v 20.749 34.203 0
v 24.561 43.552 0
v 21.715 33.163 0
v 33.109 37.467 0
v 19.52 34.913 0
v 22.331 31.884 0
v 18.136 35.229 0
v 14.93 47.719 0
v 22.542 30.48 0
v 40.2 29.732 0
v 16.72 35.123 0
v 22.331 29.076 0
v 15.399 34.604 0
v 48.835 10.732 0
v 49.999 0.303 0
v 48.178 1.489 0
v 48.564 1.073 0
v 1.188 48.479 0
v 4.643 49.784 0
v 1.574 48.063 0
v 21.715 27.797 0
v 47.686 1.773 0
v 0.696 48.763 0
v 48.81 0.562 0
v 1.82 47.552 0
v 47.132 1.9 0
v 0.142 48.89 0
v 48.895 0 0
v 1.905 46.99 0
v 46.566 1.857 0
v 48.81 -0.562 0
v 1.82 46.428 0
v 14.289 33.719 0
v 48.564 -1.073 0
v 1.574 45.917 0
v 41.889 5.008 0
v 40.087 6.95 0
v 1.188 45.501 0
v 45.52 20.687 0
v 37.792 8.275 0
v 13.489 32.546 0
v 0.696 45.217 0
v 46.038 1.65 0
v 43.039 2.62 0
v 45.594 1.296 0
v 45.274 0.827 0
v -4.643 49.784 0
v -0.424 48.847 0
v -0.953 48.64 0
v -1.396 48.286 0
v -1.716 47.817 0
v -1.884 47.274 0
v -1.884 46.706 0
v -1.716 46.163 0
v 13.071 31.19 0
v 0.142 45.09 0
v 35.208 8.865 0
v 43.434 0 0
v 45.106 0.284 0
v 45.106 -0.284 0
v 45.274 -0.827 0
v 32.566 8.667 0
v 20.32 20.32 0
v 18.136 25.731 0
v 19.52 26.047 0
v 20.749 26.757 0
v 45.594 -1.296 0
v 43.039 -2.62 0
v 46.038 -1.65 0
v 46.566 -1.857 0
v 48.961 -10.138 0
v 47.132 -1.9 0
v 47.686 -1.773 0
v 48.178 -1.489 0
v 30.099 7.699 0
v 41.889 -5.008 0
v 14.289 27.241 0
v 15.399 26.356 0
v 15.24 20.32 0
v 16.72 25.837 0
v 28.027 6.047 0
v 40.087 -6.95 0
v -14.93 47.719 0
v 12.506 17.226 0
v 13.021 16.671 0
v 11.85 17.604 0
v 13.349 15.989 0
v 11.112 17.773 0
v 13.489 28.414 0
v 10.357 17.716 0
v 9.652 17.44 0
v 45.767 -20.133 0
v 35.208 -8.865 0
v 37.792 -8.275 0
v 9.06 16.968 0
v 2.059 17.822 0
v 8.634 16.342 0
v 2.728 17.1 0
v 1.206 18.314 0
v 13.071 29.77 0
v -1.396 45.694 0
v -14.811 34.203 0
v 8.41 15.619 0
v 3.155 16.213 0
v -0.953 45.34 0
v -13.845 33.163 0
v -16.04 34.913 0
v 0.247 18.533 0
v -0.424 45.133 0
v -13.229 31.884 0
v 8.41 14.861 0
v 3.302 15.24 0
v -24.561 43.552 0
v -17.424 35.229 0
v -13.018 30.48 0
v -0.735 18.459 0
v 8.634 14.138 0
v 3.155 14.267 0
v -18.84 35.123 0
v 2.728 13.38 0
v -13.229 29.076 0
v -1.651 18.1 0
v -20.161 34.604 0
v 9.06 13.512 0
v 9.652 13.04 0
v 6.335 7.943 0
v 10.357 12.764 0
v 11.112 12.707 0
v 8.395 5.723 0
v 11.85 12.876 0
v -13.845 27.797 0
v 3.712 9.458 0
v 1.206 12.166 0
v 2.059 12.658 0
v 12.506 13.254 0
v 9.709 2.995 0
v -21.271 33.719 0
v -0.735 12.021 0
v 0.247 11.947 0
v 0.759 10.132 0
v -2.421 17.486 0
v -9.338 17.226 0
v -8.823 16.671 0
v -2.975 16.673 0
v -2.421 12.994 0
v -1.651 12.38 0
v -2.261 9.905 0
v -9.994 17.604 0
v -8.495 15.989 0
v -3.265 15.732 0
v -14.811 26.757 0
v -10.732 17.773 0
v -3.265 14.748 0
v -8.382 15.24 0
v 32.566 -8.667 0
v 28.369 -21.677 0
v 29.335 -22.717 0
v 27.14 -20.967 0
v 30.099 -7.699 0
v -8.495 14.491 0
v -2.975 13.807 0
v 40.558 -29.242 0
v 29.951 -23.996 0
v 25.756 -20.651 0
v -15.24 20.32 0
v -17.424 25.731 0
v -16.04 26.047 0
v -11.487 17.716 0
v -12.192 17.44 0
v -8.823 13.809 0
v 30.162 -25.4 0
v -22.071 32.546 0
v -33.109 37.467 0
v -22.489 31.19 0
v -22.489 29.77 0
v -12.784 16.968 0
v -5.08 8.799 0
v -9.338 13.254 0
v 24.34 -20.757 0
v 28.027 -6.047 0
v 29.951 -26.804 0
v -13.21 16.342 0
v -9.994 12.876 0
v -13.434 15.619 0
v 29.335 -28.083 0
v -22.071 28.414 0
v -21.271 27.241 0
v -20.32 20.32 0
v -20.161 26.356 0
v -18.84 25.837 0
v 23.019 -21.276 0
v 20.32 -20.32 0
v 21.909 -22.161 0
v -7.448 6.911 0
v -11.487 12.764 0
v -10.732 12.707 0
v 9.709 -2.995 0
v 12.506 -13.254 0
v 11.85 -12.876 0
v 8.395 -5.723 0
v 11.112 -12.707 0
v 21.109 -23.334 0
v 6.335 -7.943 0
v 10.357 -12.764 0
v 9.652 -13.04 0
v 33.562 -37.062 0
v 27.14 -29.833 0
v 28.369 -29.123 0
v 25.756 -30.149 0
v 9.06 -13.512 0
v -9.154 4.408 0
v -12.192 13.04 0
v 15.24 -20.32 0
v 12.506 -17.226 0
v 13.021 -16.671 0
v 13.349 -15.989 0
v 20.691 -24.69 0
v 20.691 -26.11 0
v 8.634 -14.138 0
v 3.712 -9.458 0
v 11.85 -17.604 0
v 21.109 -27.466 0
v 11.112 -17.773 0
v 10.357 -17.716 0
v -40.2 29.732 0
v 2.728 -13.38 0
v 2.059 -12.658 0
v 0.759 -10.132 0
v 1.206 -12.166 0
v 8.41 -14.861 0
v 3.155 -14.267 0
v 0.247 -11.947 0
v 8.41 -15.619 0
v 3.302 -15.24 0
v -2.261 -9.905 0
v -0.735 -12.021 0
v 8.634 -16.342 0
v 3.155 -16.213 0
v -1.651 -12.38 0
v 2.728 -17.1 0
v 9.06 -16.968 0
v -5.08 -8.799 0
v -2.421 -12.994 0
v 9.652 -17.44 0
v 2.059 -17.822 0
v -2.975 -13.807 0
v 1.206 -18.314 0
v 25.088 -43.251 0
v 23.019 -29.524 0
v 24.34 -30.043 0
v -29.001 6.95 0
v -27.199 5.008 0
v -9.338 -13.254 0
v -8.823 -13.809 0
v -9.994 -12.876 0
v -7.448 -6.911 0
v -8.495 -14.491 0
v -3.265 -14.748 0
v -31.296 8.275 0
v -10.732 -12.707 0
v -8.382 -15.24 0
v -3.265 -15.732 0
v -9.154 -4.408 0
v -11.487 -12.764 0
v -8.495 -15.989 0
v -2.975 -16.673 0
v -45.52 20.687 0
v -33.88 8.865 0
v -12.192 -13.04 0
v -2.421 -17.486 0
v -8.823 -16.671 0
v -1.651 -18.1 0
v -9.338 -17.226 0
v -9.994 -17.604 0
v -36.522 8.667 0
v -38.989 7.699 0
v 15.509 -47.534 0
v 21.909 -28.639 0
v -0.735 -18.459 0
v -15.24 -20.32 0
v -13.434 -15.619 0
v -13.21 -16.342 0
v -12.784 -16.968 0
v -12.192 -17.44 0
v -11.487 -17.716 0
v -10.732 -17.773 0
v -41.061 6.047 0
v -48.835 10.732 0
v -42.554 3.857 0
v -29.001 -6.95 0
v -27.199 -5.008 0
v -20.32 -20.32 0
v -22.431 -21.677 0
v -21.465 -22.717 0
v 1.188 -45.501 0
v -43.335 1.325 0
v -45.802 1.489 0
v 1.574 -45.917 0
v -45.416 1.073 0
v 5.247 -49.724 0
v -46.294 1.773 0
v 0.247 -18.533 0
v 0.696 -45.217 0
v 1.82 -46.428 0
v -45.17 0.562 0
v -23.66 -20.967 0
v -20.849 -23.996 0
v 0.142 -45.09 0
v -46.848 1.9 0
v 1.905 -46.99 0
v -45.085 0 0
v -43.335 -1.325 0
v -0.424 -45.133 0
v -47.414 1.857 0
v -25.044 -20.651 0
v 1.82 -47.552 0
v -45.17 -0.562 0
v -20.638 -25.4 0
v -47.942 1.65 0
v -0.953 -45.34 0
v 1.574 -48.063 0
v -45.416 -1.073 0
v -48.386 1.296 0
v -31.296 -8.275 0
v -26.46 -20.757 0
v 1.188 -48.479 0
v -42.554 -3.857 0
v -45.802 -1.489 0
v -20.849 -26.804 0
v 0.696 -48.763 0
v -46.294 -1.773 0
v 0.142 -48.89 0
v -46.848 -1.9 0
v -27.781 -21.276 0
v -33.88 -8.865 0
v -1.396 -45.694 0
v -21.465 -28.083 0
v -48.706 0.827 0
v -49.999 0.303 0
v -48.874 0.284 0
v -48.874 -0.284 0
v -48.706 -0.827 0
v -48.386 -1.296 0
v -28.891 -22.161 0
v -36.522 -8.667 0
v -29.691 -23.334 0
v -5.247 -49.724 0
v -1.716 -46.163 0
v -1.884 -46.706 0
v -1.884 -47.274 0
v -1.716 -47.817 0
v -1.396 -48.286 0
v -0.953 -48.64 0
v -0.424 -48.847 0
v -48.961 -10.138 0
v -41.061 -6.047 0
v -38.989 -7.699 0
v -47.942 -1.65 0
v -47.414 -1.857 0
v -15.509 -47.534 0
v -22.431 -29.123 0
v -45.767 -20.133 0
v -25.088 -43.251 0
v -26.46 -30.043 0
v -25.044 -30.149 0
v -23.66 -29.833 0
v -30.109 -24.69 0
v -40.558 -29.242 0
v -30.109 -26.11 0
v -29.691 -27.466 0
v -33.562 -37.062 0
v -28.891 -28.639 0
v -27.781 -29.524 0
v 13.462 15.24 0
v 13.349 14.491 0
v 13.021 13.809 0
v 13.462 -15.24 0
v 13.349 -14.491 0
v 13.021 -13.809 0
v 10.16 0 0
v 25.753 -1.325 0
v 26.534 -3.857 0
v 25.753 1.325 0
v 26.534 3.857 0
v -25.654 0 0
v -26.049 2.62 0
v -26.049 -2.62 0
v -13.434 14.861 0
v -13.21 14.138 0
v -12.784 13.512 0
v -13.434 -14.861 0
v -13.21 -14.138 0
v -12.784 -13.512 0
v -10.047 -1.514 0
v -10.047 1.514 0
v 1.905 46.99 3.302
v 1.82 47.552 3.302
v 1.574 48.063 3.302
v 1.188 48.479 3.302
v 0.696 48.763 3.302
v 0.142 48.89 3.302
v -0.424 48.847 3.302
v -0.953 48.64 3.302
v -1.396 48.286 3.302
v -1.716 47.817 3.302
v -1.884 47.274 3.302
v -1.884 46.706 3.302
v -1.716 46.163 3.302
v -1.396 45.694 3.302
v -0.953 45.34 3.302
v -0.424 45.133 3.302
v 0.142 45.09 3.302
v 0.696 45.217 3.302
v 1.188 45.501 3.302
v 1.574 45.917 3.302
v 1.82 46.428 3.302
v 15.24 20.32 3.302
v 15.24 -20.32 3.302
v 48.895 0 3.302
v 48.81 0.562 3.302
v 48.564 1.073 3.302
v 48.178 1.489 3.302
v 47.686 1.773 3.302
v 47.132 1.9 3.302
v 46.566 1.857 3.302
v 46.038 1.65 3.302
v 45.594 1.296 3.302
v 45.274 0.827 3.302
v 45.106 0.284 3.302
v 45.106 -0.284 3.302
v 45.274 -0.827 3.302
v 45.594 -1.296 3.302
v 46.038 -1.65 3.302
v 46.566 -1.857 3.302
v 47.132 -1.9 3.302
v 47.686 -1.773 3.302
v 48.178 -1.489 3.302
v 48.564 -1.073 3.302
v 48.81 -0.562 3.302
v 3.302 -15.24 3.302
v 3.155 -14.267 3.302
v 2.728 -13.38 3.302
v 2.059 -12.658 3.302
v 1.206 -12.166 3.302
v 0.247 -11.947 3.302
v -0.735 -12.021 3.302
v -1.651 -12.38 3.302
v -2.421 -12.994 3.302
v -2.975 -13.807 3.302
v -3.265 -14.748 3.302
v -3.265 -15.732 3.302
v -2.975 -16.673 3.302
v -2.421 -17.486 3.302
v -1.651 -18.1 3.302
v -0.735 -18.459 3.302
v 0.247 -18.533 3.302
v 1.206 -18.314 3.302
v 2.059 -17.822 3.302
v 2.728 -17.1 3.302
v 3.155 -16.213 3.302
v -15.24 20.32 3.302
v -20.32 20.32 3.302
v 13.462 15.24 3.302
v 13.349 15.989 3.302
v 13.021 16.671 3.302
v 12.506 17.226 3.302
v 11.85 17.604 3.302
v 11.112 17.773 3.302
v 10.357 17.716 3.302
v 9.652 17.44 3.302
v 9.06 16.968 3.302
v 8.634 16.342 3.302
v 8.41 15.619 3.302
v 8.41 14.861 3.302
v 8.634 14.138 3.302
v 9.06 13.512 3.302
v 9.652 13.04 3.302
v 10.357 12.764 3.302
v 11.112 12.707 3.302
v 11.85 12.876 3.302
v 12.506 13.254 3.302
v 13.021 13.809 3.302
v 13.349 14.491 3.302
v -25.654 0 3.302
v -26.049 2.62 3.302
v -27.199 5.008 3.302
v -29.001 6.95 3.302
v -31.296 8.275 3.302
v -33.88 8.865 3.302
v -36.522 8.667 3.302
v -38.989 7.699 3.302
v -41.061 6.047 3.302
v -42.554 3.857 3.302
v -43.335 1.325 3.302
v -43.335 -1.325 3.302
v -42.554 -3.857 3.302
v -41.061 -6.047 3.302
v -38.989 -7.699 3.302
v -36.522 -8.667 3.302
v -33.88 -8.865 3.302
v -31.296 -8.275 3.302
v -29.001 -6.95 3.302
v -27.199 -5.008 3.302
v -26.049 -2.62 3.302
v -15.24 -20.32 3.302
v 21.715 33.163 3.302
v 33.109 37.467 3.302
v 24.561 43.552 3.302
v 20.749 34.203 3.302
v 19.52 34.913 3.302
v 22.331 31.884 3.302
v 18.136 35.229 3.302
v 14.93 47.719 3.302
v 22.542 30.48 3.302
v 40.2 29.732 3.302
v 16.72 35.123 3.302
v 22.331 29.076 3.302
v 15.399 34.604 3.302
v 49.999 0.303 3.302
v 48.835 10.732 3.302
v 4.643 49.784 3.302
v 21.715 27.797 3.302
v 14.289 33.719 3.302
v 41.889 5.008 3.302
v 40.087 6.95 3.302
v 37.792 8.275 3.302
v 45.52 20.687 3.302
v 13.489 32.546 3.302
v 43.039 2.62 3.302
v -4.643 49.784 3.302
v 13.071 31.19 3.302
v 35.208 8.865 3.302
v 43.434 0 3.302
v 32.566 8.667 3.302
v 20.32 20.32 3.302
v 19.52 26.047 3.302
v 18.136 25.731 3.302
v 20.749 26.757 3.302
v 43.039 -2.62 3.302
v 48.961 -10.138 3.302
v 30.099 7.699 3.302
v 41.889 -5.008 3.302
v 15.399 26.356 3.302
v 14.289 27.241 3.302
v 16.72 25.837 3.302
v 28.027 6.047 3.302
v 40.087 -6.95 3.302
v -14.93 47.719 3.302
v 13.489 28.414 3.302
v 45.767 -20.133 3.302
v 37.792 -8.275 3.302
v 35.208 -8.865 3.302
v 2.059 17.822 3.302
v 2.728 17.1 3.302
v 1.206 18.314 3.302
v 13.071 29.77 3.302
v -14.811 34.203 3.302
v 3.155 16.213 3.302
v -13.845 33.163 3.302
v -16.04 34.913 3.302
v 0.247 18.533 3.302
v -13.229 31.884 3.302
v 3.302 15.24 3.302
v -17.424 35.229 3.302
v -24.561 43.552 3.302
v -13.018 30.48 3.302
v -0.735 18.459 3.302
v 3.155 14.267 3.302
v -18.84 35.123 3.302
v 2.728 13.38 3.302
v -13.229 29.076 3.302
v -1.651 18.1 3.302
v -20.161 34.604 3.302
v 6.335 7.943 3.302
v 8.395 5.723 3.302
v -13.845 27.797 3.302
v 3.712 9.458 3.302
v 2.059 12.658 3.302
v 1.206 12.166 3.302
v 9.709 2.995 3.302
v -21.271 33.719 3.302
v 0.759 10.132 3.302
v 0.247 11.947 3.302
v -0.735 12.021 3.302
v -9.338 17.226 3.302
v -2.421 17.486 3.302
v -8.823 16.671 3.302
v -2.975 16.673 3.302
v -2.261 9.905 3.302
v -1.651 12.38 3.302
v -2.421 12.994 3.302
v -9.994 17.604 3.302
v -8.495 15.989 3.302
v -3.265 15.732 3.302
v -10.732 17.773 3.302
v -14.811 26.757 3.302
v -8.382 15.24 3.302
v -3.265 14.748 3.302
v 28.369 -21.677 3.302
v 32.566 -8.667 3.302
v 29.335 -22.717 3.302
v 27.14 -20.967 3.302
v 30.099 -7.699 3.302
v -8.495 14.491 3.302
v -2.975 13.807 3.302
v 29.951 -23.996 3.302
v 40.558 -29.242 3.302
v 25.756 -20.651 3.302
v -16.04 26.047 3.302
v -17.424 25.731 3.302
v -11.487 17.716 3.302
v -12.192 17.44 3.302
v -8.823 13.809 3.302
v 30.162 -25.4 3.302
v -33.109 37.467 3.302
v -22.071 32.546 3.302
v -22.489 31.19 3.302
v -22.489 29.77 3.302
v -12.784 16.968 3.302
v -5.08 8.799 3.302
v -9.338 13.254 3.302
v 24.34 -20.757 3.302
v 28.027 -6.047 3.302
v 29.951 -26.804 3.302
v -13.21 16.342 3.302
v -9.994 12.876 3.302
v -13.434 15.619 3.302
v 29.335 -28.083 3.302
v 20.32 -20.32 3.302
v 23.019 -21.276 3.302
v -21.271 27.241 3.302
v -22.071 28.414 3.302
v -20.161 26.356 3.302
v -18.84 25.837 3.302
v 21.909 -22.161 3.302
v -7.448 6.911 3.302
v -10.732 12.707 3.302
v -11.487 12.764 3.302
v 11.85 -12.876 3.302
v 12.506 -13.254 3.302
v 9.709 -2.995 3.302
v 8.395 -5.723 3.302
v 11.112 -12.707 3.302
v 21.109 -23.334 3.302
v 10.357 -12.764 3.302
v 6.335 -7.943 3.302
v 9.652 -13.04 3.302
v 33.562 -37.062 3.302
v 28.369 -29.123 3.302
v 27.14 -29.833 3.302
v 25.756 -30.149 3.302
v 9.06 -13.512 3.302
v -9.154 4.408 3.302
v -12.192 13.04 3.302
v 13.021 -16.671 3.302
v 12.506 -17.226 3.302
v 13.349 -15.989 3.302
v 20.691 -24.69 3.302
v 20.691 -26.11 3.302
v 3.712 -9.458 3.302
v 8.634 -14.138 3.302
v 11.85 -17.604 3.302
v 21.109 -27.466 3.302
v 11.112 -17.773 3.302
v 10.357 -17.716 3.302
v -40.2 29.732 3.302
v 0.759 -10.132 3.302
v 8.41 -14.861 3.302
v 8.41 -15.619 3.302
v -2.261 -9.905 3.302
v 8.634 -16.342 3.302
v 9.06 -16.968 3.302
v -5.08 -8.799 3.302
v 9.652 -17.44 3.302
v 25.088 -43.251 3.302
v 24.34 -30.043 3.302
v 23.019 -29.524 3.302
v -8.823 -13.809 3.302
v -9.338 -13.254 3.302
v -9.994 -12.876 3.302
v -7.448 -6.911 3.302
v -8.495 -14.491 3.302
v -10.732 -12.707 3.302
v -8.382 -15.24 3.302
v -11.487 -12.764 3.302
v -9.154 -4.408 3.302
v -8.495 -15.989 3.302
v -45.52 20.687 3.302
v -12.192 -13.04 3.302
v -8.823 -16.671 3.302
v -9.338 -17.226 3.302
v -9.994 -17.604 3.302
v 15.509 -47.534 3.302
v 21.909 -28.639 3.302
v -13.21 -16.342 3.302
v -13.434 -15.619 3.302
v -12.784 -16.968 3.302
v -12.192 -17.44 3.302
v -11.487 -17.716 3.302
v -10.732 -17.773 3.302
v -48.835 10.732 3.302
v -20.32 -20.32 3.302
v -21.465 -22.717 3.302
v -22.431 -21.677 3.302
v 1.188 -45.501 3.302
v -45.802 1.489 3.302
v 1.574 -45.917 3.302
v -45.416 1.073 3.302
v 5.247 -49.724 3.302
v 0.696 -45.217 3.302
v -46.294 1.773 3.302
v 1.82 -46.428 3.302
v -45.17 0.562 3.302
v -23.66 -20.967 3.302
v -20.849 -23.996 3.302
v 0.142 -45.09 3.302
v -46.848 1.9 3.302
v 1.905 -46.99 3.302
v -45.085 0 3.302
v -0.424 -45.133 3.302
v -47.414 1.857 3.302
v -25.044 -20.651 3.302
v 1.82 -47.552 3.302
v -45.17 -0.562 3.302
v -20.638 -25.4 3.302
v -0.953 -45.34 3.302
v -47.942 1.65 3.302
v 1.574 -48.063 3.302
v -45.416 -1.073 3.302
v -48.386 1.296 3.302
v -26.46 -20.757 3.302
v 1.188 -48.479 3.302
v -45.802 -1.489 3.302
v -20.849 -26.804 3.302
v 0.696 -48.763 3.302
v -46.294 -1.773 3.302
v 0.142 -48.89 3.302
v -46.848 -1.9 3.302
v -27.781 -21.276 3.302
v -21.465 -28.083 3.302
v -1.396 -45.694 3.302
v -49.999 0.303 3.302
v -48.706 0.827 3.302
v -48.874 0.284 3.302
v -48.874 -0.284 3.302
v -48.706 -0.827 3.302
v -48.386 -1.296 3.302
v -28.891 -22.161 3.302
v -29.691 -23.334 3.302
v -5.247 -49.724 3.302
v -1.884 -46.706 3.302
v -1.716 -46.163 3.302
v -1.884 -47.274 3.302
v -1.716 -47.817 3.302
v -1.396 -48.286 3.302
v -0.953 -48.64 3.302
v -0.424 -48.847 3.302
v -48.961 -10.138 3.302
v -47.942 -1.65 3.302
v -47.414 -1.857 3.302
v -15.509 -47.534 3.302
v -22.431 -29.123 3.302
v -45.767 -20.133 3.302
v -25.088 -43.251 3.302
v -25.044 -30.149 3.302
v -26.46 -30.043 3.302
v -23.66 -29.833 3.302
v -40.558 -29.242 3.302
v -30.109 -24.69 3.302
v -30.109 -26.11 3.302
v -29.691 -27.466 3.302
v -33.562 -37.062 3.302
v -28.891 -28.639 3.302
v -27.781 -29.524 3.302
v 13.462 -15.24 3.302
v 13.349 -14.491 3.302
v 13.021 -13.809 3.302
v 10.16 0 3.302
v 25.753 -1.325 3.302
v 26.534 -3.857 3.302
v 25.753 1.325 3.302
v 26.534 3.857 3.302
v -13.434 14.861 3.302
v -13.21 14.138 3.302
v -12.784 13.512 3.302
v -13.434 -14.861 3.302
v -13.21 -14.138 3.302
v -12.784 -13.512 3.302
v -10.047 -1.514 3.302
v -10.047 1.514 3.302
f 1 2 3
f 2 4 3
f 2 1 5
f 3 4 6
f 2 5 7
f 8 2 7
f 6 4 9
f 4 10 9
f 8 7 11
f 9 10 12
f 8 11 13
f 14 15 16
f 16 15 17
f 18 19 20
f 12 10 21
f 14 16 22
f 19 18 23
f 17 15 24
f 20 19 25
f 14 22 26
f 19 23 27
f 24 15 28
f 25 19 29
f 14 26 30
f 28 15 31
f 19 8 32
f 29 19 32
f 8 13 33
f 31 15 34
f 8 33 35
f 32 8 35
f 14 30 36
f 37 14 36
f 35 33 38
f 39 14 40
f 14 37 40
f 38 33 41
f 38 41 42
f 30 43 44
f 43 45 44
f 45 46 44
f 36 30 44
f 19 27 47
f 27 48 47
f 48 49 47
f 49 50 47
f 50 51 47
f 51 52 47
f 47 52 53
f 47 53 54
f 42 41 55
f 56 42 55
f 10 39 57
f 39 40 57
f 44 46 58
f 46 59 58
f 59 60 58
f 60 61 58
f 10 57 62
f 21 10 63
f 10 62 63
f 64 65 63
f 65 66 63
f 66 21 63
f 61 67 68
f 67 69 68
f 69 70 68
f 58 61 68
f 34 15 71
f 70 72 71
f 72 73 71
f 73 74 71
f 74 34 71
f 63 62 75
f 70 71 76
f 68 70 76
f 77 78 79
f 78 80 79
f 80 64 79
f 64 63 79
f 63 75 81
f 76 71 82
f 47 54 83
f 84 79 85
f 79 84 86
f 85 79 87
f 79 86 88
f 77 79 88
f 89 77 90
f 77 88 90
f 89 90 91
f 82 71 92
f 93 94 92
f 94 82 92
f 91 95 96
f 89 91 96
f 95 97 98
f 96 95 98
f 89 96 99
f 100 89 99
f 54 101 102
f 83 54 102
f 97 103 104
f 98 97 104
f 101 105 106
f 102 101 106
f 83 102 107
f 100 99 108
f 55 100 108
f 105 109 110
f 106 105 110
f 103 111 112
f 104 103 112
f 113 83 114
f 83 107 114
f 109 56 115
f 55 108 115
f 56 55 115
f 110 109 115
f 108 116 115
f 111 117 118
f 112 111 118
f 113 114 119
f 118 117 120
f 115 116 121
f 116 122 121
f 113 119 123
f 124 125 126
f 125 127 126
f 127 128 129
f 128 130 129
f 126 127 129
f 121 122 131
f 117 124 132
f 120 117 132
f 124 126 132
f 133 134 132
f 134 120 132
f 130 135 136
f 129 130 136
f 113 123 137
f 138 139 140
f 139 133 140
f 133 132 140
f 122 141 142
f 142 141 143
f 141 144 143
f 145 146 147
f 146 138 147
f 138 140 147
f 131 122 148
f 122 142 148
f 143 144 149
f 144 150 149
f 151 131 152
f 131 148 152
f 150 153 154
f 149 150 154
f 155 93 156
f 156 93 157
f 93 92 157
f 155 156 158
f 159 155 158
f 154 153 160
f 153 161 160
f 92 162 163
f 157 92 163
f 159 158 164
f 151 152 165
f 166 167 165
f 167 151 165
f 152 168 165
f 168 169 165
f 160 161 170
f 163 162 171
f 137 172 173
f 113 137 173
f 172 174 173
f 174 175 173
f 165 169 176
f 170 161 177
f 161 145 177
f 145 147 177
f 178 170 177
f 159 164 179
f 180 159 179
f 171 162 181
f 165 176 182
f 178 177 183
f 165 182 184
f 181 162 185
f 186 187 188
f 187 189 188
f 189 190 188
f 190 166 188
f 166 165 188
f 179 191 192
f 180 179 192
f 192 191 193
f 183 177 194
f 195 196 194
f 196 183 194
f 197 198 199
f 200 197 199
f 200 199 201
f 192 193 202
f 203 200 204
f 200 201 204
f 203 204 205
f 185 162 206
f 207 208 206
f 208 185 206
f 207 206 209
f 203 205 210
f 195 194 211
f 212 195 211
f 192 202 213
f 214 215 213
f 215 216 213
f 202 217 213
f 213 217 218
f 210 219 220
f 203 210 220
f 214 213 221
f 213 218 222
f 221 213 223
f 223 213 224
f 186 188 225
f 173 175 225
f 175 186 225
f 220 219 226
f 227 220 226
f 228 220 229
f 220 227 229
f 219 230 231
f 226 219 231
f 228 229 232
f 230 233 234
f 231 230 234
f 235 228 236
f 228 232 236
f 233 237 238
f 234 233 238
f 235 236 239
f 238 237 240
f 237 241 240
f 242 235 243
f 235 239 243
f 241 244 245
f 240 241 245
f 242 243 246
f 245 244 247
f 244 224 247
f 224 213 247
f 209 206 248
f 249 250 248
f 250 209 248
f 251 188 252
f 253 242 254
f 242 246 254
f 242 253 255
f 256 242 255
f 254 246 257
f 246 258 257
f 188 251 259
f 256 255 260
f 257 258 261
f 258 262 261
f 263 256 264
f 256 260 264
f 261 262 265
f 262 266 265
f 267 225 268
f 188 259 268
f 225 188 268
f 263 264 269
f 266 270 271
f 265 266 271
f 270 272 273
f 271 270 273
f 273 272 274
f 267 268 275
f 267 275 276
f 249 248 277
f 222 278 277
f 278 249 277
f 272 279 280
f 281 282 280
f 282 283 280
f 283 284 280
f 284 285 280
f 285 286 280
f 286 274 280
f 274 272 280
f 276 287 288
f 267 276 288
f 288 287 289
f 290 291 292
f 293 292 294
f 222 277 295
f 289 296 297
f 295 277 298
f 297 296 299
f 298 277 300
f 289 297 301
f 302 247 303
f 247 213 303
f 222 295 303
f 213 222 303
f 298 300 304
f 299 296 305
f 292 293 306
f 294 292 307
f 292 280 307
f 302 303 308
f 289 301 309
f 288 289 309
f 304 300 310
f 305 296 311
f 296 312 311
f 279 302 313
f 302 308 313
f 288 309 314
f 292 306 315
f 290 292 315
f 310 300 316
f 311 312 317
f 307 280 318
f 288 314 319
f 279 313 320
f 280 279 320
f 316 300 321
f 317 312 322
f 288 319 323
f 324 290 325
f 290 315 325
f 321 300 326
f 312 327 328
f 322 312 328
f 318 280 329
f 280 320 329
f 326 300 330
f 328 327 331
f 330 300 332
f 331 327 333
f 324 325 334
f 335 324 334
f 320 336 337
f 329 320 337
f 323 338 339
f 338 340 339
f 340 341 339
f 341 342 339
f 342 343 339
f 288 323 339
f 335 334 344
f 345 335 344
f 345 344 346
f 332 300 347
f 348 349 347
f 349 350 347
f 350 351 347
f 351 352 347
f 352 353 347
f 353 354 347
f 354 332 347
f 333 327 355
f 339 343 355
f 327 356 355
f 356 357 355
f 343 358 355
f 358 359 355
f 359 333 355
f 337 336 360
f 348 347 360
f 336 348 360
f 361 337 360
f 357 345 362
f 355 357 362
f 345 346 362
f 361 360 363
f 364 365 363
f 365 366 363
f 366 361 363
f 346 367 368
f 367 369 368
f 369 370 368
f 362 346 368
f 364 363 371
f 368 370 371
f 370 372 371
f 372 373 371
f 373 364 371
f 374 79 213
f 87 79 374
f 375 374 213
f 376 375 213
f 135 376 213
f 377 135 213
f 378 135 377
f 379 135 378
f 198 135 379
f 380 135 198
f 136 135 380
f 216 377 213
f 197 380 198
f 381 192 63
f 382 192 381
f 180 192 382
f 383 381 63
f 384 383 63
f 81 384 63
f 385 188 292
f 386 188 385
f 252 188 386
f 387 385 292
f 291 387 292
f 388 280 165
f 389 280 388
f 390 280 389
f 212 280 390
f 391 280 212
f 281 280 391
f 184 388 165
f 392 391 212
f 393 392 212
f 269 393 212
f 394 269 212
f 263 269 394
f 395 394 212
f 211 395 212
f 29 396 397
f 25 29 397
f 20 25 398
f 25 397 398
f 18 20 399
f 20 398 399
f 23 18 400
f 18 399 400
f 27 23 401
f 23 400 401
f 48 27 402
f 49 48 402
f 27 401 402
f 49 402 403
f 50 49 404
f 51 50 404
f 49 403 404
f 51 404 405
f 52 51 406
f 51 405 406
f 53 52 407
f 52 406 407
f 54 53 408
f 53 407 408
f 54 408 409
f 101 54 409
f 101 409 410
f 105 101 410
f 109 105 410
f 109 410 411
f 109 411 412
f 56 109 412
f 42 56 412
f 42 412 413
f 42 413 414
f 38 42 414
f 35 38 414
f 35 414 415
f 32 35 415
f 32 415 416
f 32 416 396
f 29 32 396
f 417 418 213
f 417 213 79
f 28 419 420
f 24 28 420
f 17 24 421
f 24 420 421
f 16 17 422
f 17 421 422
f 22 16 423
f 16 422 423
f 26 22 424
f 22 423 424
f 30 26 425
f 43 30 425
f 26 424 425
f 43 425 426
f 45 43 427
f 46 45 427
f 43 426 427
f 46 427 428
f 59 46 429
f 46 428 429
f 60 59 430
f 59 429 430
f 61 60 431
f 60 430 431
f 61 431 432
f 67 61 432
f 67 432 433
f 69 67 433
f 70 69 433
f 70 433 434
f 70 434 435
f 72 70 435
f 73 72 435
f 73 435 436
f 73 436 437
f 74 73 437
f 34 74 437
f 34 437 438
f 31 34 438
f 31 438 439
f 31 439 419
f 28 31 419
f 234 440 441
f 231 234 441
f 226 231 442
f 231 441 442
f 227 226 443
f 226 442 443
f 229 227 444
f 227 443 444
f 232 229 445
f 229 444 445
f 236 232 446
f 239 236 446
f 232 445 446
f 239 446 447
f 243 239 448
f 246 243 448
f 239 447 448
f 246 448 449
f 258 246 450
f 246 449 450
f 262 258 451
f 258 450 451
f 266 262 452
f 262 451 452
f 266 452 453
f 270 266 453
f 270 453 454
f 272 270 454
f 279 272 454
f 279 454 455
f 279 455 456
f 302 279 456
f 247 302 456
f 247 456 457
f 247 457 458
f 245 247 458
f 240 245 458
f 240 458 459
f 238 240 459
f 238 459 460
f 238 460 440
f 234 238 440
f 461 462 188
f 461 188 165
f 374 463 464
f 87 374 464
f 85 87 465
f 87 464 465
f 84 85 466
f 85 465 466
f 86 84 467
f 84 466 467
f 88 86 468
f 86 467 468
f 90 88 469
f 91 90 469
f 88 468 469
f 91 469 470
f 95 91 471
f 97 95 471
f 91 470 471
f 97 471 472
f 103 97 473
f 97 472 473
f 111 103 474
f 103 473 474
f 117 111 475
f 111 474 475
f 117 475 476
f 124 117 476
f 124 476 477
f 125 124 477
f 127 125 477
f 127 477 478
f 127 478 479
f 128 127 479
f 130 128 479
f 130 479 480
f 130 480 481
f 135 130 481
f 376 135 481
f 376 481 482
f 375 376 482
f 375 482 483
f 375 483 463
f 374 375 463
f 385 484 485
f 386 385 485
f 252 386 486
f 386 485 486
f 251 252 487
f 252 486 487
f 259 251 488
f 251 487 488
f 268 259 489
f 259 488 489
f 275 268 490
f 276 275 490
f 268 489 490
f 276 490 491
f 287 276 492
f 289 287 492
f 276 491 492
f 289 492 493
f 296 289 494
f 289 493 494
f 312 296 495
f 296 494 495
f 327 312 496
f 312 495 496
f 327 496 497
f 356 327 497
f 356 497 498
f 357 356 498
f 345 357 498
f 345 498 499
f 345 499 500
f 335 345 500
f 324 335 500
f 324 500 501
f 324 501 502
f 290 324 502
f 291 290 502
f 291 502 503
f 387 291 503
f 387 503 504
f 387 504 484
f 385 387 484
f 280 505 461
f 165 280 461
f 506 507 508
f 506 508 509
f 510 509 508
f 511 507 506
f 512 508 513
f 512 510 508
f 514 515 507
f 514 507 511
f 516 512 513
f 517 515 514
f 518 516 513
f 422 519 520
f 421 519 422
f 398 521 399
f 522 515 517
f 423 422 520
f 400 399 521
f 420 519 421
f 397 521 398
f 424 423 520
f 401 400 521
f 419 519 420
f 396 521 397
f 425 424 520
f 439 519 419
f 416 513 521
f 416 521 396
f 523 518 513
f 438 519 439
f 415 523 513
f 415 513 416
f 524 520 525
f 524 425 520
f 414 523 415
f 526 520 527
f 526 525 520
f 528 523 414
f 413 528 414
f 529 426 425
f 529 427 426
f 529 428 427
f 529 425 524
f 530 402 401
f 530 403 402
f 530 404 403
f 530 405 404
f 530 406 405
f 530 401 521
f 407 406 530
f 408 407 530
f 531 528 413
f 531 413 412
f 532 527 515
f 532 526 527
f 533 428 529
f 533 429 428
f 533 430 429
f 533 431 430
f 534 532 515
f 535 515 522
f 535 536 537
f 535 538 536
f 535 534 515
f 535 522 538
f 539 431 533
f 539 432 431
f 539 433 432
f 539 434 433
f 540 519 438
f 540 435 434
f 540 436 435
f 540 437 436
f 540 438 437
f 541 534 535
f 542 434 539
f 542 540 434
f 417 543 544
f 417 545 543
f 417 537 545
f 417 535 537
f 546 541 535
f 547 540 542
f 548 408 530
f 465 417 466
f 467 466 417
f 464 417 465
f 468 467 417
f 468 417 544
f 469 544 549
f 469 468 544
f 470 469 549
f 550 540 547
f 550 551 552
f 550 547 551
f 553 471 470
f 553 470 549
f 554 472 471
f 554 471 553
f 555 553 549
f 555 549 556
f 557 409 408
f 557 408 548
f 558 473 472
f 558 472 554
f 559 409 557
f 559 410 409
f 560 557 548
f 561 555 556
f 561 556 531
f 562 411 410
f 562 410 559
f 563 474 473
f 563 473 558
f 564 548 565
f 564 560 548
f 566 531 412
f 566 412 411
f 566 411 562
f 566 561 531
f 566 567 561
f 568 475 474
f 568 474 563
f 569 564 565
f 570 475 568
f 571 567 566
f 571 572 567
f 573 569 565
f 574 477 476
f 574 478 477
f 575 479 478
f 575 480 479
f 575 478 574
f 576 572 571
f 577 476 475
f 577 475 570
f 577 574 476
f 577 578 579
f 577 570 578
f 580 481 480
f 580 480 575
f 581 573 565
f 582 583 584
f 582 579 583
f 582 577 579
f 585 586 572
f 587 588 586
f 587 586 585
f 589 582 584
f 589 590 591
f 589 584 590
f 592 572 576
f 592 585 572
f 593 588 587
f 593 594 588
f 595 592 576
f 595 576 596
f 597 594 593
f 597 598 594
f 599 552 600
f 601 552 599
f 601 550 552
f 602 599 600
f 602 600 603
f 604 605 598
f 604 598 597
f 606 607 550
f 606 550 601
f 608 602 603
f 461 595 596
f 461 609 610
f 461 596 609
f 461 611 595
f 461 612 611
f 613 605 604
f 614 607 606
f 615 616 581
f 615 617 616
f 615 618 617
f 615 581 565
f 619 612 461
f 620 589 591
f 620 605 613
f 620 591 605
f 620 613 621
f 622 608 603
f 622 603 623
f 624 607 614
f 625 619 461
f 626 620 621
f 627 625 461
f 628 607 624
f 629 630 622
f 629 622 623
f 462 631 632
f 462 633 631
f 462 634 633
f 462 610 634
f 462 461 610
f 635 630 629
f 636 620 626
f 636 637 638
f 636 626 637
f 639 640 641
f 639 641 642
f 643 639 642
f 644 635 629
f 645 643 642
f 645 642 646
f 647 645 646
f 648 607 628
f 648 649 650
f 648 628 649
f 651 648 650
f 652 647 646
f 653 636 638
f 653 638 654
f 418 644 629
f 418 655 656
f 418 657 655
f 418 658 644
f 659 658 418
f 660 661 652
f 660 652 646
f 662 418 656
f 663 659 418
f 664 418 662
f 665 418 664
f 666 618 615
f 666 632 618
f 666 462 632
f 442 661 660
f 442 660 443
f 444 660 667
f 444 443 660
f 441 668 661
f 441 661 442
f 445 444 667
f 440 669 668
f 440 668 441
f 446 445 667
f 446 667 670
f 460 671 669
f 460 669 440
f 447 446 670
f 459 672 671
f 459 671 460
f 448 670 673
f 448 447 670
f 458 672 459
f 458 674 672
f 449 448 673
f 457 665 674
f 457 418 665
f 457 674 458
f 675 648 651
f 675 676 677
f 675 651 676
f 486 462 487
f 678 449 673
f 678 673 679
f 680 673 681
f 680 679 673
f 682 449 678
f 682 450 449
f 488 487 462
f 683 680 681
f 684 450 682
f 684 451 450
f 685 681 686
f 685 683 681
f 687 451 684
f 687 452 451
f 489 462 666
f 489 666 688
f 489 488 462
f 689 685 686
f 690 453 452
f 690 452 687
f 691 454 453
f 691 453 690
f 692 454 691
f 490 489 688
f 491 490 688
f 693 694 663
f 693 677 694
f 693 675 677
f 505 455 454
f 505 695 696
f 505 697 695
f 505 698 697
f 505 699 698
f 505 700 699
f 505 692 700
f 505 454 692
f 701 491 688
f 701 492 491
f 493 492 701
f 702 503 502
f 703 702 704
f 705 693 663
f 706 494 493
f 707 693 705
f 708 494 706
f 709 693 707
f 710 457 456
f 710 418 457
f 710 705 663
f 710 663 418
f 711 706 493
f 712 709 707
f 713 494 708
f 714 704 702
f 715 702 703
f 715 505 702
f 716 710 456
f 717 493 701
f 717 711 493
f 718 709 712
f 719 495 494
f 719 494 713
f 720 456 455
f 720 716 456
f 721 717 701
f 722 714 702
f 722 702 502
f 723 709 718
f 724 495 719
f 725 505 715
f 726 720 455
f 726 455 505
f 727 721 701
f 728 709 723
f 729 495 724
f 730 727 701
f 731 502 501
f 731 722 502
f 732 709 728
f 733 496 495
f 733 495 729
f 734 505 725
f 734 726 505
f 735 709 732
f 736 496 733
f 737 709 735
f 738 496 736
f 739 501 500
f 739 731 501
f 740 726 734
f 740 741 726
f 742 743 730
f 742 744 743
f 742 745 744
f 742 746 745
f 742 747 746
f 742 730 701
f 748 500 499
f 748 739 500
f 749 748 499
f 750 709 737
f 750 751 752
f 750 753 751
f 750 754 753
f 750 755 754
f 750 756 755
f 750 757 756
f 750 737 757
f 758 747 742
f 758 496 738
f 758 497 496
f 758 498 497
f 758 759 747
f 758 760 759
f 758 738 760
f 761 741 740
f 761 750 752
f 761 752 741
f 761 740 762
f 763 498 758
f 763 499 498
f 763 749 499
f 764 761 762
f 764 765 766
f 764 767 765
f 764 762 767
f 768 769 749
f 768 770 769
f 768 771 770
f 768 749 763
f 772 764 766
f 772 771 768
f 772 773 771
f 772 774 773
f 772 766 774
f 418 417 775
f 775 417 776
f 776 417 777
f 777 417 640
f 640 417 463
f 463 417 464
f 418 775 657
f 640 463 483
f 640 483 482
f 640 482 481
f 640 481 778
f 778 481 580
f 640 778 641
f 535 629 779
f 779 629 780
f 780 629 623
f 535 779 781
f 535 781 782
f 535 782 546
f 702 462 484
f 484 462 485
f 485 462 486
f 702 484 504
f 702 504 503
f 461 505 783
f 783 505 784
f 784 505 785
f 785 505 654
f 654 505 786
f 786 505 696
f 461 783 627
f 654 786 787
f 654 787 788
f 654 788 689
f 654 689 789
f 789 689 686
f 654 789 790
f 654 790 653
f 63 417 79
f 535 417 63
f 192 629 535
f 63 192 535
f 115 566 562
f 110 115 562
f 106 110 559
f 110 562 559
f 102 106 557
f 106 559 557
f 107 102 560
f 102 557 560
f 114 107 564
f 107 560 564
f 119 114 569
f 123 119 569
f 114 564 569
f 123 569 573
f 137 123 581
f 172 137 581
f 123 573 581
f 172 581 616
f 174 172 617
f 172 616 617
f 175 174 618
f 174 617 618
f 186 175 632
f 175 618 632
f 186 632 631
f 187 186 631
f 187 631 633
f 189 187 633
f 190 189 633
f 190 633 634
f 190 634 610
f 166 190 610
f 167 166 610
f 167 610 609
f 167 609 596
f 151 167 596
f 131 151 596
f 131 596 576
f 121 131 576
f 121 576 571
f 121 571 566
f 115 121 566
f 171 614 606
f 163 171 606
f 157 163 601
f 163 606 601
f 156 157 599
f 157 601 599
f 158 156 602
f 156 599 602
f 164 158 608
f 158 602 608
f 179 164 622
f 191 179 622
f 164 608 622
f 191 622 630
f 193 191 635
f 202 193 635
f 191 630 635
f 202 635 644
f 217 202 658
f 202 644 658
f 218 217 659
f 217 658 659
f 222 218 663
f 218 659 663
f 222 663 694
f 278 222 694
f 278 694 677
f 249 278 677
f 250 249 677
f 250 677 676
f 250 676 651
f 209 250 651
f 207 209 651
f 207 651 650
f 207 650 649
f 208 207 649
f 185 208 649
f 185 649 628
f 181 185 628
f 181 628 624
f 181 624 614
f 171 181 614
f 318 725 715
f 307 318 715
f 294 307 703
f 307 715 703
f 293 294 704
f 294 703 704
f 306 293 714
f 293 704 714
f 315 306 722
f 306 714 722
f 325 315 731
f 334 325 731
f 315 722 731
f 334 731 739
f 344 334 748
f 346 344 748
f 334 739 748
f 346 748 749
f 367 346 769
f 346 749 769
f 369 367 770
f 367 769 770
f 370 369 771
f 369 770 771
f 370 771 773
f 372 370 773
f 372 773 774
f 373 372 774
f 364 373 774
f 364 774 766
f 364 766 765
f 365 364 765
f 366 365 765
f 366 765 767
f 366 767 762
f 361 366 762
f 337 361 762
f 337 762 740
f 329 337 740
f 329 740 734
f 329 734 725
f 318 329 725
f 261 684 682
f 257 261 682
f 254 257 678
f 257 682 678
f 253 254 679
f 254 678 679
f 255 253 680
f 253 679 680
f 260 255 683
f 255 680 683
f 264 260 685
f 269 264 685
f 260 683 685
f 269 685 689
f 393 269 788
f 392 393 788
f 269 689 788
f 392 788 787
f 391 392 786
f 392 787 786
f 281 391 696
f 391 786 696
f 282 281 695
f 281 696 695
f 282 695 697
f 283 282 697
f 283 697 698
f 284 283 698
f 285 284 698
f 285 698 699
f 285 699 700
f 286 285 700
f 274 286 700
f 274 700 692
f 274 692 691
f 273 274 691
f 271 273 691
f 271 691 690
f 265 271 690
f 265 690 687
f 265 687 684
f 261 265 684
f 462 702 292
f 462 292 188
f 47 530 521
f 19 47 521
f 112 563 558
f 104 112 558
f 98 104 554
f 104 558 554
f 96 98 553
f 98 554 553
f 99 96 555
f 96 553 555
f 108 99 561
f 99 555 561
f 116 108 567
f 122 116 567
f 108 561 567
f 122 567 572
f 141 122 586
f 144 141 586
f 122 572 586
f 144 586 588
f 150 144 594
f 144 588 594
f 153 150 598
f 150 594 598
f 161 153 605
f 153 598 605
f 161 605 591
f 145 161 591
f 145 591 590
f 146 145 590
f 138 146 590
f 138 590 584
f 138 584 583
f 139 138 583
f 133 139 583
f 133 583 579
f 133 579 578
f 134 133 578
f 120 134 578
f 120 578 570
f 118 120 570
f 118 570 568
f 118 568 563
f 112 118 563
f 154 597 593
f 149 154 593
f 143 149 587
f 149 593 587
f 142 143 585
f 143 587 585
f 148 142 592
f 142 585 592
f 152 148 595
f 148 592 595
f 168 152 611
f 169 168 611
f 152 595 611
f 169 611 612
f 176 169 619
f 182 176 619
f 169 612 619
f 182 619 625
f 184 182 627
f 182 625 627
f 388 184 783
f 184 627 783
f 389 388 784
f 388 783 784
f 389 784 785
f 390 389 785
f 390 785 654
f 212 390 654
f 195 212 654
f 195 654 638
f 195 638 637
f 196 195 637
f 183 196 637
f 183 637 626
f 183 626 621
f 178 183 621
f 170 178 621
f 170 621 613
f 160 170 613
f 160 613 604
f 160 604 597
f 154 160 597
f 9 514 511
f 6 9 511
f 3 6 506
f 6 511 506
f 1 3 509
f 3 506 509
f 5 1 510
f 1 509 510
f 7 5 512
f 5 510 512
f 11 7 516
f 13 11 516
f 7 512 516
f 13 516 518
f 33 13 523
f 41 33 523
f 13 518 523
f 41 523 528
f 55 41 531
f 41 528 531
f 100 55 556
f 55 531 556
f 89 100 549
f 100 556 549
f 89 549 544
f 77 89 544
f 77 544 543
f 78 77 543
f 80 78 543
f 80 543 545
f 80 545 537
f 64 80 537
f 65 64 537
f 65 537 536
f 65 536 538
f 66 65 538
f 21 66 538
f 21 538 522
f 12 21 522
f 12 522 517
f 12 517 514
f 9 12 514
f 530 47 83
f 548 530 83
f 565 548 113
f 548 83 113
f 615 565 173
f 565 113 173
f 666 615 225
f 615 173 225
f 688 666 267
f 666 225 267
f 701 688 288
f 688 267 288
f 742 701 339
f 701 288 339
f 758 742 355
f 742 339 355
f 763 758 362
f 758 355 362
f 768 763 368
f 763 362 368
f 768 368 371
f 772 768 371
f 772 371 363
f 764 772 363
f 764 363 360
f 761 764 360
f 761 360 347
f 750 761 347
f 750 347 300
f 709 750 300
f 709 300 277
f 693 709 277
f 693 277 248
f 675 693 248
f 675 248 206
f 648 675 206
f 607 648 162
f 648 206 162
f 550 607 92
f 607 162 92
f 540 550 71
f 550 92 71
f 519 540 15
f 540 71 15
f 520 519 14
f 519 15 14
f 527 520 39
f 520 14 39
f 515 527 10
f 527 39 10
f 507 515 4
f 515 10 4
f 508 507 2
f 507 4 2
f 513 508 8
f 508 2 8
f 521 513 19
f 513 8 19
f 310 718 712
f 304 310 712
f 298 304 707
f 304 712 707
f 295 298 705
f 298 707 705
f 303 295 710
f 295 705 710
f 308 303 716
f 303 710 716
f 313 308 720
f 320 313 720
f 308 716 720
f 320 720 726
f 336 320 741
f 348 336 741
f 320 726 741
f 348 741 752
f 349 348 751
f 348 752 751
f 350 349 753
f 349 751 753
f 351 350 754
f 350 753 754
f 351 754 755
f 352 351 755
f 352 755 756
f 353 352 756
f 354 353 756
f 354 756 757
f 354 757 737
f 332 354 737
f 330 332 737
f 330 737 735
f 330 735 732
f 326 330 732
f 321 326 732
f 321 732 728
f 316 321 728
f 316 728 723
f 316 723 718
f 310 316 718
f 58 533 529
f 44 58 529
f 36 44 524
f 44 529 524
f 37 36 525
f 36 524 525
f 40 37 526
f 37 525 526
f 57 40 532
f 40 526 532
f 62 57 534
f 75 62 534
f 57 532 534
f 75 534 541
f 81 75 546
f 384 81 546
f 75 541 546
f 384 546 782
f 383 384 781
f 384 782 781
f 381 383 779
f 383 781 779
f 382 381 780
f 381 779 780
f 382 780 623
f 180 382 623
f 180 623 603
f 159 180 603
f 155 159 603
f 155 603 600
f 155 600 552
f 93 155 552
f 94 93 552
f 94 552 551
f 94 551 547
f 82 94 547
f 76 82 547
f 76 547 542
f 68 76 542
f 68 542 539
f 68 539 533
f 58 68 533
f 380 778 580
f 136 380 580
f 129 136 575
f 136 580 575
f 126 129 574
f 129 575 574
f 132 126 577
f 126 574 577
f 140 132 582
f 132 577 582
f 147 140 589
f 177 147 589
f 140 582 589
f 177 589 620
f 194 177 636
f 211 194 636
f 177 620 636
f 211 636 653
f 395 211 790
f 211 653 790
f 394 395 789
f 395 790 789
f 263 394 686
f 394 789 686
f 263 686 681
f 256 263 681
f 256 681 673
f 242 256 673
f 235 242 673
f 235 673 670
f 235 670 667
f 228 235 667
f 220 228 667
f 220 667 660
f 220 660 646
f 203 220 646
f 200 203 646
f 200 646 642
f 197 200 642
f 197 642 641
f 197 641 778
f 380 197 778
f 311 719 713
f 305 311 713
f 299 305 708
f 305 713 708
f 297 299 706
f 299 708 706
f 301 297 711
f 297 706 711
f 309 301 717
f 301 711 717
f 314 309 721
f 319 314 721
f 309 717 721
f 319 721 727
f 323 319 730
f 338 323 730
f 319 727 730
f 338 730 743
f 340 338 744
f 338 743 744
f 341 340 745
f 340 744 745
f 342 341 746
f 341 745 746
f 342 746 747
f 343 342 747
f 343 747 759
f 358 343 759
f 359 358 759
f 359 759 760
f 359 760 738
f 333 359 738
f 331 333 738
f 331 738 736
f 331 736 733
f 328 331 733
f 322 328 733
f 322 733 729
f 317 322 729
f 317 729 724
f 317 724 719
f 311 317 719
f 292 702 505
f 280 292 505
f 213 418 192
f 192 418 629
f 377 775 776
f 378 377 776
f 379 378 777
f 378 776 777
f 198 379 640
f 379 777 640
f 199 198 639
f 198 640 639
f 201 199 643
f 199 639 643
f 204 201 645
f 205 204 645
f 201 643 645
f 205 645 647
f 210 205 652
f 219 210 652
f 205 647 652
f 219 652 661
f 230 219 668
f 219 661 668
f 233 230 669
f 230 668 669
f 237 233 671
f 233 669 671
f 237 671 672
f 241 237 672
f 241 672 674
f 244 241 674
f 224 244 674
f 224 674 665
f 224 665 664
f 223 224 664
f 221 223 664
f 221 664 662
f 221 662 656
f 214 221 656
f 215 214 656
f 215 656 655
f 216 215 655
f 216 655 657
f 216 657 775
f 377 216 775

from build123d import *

# Parameters (mm, degrees)
SKETCH_1_R          = 50
EXTRUDE_1_DEPTH     = 3.302
SKETCH_2_R          = 4.7625
CUT_EXTRUDE_1_DEPTH = 71.787733429
SKETCH_4_R          = 10.16
CUT_EXTRUDE_3_DEPTH = 71.787733429
SKETCH_3_W          = 9.285115832
SKETCH_3_H          = 8.046477463
CUT_EXTRUDE_2_DEPTH = 71.787733429
SKETCH_8_R          = 8.89
SKETCH_8_W          = 5.08
SKETCH_8_H          = 40.64
CUT_EXTRUDE_4_DEPTH = 71.787733429
SKETCH_9_R          = 2.54
SKETCH_9_R_2        = 3.302
CUT_EXTRUDE_5_DEPTH = 71.787733429
SKETCH_10_R         = 1.905
CUT_EXTRUDE_6_DEPTH = 71.787733429


with BuildPart() as part:
    # 草图1 → 凸台-拉伸1 (new body)
    with BuildSketch(Plane.XY):
        with Locations(Location((0, 0, 0), (0, 0, 180))):
            Circle(SKETCH_1_R)
    extrude(amount=EXTRUDE_1_DEPTH)

    # 草图2 → 切除-拉伸1 (cut, through all)
    with BuildSketch(Plane.XY.offset(3.302)):
        with Locations((-17.78, 30.48)):
            Circle(SKETCH_2_R)
        with Locations((-25.4, -25.4)):
            Circle(SKETCH_2_R)
        with Locations((25.4, -25.4)):
            Circle(SKETCH_2_R)
        with Locations((17.78, 30.48)):
            Circle(SKETCH_2_R)
    extrude(amount=-CUT_EXTRUDE_1_DEPTH, mode=Mode.SUBTRACT)

    # 草图4 → 切除-拉伸3 (cut, through all)
    with BuildSketch(Plane.XY.offset(3.302)):
        Circle(SKETCH_4_R)
    extrude(amount=-CUT_EXTRUDE_3_DEPTH, mode=Mode.SUBTRACT)

    # 草图3 → 切除-拉伸2 (cut, through all)
    with BuildSketch(Plane.XY.offset(3.302)):
        with Locations((0, 53.807238732)):
            Rectangle(SKETCH_3_W, SKETCH_3_H)
    extrude(amount=-CUT_EXTRUDE_2_DEPTH, mode=Mode.SUBTRACT)

    # 草图8 → 切除-拉伸4 (cut, through all)
    with BuildSketch(Plane.XY.offset(3.302)):
        with Locations((34.544, 0)):
            Circle(SKETCH_8_R)
        with Locations((-34.544, 0)):
            Circle(SKETCH_8_R)
        with Locations((17.78, 0)):
            Rectangle(SKETCH_8_W, SKETCH_8_H)
        with Locations((-17.78, 0)):
            Rectangle(SKETCH_8_W, SKETCH_8_H)
    extrude(amount=-CUT_EXTRUDE_4_DEPTH, mode=Mode.SUBTRACT)

    # 草图9 → 切除-拉伸5 (cut, through all)
    with BuildSketch(Plane.XY.offset(3.302)):
        with Locations((-10.922, 15.24)):
            Circle(SKETCH_9_R)
        with Locations((10.922, 15.24)):
            Circle(SKETCH_9_R)
        with Locations((-10.922, -15.24)):
            Circle(SKETCH_9_R)
        with Locations((10.922, -15.24)):
            Circle(SKETCH_9_R)
        with Locations((0, 15.24)):
            Circle(SKETCH_9_R_2)
        with Locations((0, -15.24)):
            Circle(SKETCH_9_R_2)
    extrude(amount=-CUT_EXTRUDE_5_DEPTH, mode=Mode.SUBTRACT)

    # 草图10 → 切除-拉伸6 (cut, through all)
    with BuildSketch(Plane.XY.offset(3.302)):
        with Locations((0, 46.99)):
            Circle(SKETCH_10_R)
        with Locations((46.99, 0)):
            Circle(SKETCH_10_R)
        with Locations((0, -46.99)):
            Circle(SKETCH_10_R)
        with Locations((-46.99, 0)):
            Circle(SKETCH_10_R)
    extrude(amount=-CUT_EXTRUDE_6_DEPTH, mode=Mode.SUBTRACT)


solid = part.part
